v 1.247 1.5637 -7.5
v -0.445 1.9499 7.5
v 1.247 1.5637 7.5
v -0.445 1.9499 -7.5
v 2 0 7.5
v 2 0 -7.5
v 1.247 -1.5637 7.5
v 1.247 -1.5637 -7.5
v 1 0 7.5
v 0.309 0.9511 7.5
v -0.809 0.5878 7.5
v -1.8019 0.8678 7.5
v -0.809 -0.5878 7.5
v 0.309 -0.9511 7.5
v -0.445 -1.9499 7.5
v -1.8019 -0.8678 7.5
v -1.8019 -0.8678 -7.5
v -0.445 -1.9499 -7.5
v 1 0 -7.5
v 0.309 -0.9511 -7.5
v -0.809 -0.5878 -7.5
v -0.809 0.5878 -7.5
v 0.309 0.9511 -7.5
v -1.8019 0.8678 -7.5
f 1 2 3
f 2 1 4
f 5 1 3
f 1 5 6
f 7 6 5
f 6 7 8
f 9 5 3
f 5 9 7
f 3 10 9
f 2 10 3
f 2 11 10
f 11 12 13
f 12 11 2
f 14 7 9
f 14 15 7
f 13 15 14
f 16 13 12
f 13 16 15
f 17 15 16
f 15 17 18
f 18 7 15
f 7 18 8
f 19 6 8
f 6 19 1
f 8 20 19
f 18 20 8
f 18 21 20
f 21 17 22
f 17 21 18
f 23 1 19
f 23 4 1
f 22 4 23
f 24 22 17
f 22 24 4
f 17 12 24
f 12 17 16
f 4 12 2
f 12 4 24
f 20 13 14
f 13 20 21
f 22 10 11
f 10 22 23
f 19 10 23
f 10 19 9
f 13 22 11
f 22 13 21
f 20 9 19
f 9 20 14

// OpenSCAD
// Parameters
length = 15; //[8:30:1]
center = true; //[0:1:1]
forced_id = 0; //[0:6:0.1]
ptfe_od = 4; //[2:8:0.1]
ptfe_id_nominal = 2; //[1:6:0.1]
eps_overlap = 0.8; //[0.2:2:0.1]

// Tubing - complete geometry
module tubing() {
  color([0.85, 0.85, 0.8]) { // Off-white for PTFE
    difference() {
      // Outer cylinder
      cylinder(h=length, r=ptfe_od/2, center=center);
      // Inner cylinder (cut)
      cylinder(h=length + 2*eps_overlap, r=((forced_id>0)?forced_id:ptfe_id_nominal)/2, center=center);
    }
  }
}

// Assembly
module assembly() {
  tubing();
}

assembly();
